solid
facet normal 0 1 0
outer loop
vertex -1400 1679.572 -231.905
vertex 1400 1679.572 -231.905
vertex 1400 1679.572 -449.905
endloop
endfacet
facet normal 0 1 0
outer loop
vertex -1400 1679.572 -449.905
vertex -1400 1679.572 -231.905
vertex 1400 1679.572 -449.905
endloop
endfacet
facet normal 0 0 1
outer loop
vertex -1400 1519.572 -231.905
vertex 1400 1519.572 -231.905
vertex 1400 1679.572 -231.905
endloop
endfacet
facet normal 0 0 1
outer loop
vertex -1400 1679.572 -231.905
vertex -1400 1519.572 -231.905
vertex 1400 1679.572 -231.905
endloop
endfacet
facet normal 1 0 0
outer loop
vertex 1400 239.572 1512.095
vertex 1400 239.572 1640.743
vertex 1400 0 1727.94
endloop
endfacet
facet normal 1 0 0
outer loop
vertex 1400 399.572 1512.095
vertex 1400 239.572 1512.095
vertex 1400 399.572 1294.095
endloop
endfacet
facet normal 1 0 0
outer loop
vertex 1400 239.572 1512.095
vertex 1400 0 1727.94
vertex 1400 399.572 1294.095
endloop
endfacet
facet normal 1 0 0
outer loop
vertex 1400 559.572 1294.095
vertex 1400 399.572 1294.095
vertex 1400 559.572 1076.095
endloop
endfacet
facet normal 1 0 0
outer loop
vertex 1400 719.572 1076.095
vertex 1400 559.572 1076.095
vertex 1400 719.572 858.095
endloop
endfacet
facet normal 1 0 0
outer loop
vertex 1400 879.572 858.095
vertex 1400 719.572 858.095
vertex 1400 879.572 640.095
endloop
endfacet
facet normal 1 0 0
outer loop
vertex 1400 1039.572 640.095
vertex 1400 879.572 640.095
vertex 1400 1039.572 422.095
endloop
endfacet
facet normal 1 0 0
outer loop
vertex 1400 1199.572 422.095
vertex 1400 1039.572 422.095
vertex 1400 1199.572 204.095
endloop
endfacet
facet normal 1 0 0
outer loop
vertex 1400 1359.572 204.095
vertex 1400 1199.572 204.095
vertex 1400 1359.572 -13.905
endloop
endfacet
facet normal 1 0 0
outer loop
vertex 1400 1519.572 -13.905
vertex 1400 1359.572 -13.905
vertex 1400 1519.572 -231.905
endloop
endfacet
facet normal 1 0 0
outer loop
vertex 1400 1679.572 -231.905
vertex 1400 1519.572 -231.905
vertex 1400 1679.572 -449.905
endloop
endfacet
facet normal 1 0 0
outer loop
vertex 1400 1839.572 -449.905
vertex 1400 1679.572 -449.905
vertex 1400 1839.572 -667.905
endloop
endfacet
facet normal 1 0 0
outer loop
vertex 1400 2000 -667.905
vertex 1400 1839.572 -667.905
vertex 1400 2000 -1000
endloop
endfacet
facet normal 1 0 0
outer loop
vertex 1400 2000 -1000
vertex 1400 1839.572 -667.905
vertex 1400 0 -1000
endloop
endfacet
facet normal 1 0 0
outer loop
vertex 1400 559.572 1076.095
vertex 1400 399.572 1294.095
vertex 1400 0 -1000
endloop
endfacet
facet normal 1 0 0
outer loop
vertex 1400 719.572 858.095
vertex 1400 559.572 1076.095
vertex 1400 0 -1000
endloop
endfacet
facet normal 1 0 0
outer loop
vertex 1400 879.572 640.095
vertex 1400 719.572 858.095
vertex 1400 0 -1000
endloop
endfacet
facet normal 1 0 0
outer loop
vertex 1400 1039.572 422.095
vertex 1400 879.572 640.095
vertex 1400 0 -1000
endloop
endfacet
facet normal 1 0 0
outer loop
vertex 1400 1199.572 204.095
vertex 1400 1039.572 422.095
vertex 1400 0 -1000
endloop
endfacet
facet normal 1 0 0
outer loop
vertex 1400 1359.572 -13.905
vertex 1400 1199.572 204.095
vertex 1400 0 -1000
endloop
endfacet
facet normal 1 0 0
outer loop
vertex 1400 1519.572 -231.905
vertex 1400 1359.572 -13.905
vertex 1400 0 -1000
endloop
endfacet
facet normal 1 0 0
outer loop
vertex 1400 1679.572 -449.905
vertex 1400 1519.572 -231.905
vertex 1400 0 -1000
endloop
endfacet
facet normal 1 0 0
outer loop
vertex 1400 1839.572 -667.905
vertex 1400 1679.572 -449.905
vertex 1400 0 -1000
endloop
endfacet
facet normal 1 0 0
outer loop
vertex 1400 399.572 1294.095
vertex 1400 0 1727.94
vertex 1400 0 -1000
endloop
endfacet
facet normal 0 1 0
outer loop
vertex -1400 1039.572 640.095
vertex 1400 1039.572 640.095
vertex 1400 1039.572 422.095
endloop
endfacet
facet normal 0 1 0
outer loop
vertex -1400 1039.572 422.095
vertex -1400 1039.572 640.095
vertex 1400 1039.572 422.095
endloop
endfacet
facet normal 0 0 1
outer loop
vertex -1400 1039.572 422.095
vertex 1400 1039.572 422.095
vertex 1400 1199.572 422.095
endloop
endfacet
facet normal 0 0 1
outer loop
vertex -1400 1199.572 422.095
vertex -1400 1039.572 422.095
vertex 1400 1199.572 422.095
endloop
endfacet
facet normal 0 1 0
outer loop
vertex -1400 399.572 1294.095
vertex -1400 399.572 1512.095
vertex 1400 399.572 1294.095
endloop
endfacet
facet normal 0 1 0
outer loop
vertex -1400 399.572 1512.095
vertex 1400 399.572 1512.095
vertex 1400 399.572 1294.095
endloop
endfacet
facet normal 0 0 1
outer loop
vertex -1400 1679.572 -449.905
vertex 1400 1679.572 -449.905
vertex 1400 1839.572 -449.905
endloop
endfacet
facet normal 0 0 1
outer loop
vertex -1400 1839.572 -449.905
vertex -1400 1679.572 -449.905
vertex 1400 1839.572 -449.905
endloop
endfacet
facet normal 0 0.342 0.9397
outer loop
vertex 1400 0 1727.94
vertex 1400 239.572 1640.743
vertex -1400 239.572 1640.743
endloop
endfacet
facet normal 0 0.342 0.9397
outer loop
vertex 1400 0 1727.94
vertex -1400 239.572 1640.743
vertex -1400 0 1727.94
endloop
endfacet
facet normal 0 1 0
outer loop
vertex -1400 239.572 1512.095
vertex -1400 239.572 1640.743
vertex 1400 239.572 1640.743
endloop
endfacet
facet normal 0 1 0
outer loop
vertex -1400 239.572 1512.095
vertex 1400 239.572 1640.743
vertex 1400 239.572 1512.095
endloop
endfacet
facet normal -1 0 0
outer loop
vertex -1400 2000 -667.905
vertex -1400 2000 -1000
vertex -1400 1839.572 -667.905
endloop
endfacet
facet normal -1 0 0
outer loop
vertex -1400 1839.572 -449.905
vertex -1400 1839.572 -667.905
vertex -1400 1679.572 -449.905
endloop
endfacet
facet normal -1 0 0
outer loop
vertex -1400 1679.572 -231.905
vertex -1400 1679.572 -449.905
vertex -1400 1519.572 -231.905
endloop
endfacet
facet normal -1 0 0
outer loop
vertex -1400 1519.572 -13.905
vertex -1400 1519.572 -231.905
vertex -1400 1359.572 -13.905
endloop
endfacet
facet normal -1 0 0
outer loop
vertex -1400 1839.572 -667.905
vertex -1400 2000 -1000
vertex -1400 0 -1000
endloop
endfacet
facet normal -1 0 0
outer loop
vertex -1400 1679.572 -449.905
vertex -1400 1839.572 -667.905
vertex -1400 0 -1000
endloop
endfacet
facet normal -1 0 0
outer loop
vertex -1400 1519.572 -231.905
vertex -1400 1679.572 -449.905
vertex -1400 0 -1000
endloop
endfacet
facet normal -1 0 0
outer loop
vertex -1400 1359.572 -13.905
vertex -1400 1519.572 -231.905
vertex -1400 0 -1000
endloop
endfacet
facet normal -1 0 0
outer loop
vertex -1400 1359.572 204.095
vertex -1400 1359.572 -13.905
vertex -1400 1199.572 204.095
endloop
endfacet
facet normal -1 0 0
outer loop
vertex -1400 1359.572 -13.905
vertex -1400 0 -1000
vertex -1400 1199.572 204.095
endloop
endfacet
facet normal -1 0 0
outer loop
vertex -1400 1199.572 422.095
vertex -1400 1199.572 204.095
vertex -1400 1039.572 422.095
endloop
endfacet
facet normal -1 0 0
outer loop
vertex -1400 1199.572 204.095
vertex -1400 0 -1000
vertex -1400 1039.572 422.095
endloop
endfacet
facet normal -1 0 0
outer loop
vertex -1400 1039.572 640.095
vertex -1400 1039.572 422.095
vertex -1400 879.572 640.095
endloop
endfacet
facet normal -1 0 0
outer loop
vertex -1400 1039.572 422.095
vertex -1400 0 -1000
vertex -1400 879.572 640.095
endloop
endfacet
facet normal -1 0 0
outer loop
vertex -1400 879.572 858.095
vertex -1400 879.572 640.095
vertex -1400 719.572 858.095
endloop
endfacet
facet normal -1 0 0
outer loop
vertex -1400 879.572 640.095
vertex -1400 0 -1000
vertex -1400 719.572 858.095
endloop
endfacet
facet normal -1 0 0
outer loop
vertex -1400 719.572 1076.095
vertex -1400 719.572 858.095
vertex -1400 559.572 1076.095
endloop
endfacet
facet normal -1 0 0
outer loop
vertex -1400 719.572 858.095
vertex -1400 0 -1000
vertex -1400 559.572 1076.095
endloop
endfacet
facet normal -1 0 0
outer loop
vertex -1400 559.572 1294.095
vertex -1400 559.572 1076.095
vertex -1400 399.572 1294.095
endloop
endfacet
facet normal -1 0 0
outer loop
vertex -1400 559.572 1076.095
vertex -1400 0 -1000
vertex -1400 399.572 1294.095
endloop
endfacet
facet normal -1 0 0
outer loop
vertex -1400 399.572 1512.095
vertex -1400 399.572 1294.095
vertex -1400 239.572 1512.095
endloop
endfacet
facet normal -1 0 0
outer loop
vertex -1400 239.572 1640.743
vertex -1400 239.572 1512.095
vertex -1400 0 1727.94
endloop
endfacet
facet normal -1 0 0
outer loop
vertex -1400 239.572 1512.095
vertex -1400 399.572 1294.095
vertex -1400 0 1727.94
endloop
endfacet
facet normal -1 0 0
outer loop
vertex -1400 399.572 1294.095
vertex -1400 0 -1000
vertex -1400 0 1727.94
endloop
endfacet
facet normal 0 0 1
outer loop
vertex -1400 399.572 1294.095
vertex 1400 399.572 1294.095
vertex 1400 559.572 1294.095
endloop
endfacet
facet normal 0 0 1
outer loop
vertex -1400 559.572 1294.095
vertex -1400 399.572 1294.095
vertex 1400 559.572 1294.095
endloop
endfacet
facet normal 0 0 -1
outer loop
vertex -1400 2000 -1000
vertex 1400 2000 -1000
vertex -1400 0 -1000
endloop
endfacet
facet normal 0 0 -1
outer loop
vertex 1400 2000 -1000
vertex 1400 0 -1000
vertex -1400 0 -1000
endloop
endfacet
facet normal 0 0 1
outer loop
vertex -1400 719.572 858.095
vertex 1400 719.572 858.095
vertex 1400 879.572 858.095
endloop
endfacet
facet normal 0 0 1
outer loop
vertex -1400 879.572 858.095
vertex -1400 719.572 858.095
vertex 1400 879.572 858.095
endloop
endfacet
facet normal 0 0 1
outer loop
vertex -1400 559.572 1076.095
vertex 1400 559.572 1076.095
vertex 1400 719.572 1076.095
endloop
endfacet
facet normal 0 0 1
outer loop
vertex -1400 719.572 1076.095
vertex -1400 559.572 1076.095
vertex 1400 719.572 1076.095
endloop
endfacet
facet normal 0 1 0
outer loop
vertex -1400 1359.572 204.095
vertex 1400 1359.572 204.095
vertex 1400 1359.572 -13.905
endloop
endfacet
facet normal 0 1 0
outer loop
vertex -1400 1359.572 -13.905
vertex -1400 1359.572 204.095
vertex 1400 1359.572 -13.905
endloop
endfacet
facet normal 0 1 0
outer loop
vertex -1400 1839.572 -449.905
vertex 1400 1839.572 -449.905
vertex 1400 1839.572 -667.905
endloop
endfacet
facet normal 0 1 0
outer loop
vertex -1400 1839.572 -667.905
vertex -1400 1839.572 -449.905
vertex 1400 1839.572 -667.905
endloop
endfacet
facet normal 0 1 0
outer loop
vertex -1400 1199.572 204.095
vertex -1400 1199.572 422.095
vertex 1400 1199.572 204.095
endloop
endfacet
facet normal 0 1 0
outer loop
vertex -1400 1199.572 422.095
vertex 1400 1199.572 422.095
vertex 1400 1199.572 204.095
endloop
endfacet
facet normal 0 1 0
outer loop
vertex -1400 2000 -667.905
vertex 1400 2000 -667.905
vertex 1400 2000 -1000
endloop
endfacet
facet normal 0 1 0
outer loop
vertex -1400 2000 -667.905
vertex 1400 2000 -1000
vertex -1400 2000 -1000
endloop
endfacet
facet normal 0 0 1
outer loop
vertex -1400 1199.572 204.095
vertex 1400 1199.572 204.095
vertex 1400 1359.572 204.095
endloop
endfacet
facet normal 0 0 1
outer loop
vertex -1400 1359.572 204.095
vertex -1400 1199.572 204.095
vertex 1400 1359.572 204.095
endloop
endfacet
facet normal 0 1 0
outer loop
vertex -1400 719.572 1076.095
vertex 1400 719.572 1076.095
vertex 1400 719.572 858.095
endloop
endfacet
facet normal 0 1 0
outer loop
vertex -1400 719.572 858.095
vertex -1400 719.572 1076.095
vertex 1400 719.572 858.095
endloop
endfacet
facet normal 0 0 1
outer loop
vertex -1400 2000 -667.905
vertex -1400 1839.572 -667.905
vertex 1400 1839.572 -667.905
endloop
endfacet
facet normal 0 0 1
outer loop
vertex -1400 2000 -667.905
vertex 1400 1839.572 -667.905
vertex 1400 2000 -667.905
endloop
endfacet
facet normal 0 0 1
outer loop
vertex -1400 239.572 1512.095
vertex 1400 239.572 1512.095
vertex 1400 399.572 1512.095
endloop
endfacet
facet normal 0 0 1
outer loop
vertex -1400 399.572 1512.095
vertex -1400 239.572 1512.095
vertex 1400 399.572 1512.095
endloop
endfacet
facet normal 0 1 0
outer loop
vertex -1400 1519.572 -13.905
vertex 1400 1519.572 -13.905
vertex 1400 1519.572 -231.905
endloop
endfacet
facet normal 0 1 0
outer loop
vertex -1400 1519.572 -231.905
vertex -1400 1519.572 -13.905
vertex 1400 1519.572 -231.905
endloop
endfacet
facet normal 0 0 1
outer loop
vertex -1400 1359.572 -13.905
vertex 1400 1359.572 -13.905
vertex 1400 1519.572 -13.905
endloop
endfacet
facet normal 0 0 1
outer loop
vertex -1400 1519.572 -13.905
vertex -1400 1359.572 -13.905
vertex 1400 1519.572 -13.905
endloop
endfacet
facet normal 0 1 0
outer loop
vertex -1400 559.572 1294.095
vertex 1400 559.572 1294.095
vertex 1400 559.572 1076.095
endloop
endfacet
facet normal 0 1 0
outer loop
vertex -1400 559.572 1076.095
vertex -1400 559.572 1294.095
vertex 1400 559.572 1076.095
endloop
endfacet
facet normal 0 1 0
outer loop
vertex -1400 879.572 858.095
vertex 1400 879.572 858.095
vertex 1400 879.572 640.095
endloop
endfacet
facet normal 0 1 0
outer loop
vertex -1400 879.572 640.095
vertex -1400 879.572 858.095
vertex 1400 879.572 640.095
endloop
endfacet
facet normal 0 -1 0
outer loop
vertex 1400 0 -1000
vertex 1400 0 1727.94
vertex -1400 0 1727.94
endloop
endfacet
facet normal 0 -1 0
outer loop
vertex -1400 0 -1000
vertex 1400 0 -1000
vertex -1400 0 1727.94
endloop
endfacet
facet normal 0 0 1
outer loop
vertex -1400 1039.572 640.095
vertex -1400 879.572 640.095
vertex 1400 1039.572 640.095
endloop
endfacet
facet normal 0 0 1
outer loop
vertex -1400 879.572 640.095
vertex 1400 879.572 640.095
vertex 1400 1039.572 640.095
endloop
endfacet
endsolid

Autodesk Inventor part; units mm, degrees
ref_plane "YZ Plane" through (0, 0, 0) normal (1, 0, 0) x (0, 1, 0)
ref_plane "XZ Plane" through (0, 0, 0) normal (0, 1, 0) x (-1, 0, 0)
ref_plane "XY Plane" through (0, 0, 0) normal (0, 0, 1) x (1, 0, 0)
sketch "Sketch1" plane through (0, 0, 0) normal (0, 1, 0) x (-1, 0, 0)
  line L0 (1400, 1000) -> (-1400, 1000)
  line L1 (-1400, 1000) -> (-1400, -1000)
  line L2 (-1400, -1000) -> (1400, -1000)
  line L3 (1400, -1000) -> (1400, 1000)
  line L4 (1400, 1000) -> (-1400, -1000) construction
  line L5 (-1400, 1000) -> (1400, -1000) construction
  point P0 (0, 0)
  dimension "d0" = 2800
  dimension "d1" = 2000
extrude "Extrusion1" add sketch "Sketch1" along normal blind 2000
sketch "Sketch2" plane through (1400, 0, 1000) normal (1, 0, 0) x (0, 0, -1)
  line L0 (0, 2000) -> (2000, 2000) projected
  line L1 (0, 0) -> (2000, 0) projected
  line L2 (0, 2000) -> (0, 0)
  line L3 (0, 0) -> (-727.9405, 0)
  line L4 (0, 2000) -> (-727.9405, 0)
  line L5 (0, 2000) -> (2128.3555, 2000) construction
  point P0 (1000, 0)
  dimension "d4" = 110
extrude "Extrusion2" add sketch "Sketch2" against normal blind 2800
sketch "Sketch3" plane through (1400, 0, -1000) normal (1, 0, 0) x (0, 0, -1)
  line L0 (-2.1545, -0.4275) -> (-2.1545, 1999.5725)
  line L1 (-2.1545, -0.4275) -> (-2.1545, 159.5725)
  line L2 (-2.1545, 159.5725) -> (-2.1545, 319.5725)
  line L3 (-2.1545, 319.5725) -> (-2.1545, 479.5725)
  line L4 (-2.1545, 479.5725) -> (-2.1545, 639.5725)
  line L5 (-2.1545, 639.5725) -> (-2.1545, 799.5725)
  line L6 (-2.1545, 799.5725) -> (-2.1545, 959.5725)
  line L7 (-2.1545, 959.5725) -> (-2.1545, 1119.5725)
  line L8 (-2.1545, 1119.5725) -> (-2.1545, 1279.5725)
  line L9 (-2.1545, 1279.5725) -> (-2.1545, 1439.5725)
  line L10 (-2.1545, 1439.5725) -> (-2.1545, 1599.5725)
  line L11 (-2.1545, 1599.5725) -> (-2.1545, 1759.5725)
  line L12 (-2.1545, 1759.5725) -> (-2.1545, 1919.5725)
  line L13 (-2.1545, 1919.5725) -> (-2.1545, 1999.9008)
  line L14 (-2.1545, -0.4275) -> (-2730.0949, -0.4275)
  line L15 (-2730.0949, -0.4275) -> (-2512.0949, -0.4275)
  line L16 (-2512.0949, -0.4275) -> (-2294.0949, -0.4275)
  line L17 (-2294.0949, -0.4275) -> (-2076.0949, -0.4275)
  line L18 (-2076.0949, -0.4275) -> (-1858.0949, -0.4275)
  line L19 (-1858.0949, -0.4275) -> (-1640.0949, -0.4275)
  line L20 (-1640.0949, -0.4275) -> (-1422.0949, -0.4275)
  line L21 (-1422.0949, -0.4275) -> (-1204.0949, -0.4275)
  line L22 (-1204.0949, -0.4275) -> (-986.0949, -0.4275)
  line L23 (-986.0949, -0.4275) -> (-768.0949, -0.4275)
  line L24 (-768.0949, -0.4275) -> (-550.0949, -0.4275)
  line L25 (-550.0949, -0.4275) -> (-332.0949, -0.4275)
  line L26 (-332.0949, -0.4275) -> (-114.0949, -0.4275)
  line L27 (-114.0949, -0.4275) -> (-2.1545, -0.4275)
  line L28 (-2730.0949, -0.4275) -> (-2642.7421, 239.5725)
  line L29 (-2730.0949, -0.4275) -> (-2002.1545, 1999.5725)
  line L30 (-2642.7421, 239.5725) -> (-2512.0949, 239.5725)
  line L31 (-2512.0949, 239.5725) -> (-2512.0949, 399.5725)
  line L32 (-2512.0949, 399.5725) -> (-2294.0949, 399.5725)
  line L33 (-2294.0949, 399.5725) -> (-2294.0949, 559.5725)
  line L34 (-2294.0949, 559.5725) -> (-2076.0949, 559.5725)
  line L35 (-2076.0949, 559.5725) -> (-2076.0949, 719.5725)
  line L36 (-2076.0949, 719.5725) -> (-1858.0949, 719.5725)
  line L37 (-1858.0949, 719.5725) -> (-1858.0949, 879.5725)
  line L38 (-1858.0949, 879.5725) -> (-1640.0949, 879.5725)
  line L39 (-1640.0949, 879.5725) -> (-1640.0949, 1039.5725)
  line L40 (-1640.0949, 1039.5725) -> (-1422.0949, 1039.5725)
  line L41 (-1422.0949, 1039.5725) -> (-1422.0949, 1199.5725)
  line L42 (-1422.0949, 1199.5725) -> (-1204.0949, 1199.5725)
  line L43 (-1204.0949, 1199.5725) -> (-1204.0949, 1359.5725)
  line L44 (-1204.0949, 1359.5725) -> (-986.0949, 1359.5725)
  line L45 (-986.0949, 1359.5725) -> (-986.0949, 1519.5725)
  line L46 (-986.0949, 1519.5725) -> (-768.0949, 1519.5725)
  line L47 (-768.0949, 1519.5725) -> (-768.0949, 1679.5725)
  line L48 (-768.0949, 1679.5725) -> (-550.0949, 1679.5725)
  line L49 (-550.0949, 1679.5725) -> (-550.0949, 1839.5725)
  line L50 (-550.0949, 1839.5725) -> (-332.0949, 1839.5725)
  line L51 (-332.0949, 1839.5725) -> (-332.0949, 1999.5725)
  line L52 (-332.0949, 1999.5725) -> (-2002.1545, 1999.5725)
  line L53 (-2002.1545, 1999.5725) -> (-2642.7421, 239.5725)
  line L54 (-2727.9405, 0) -> (0, 0) projected
  line L55 (-332.0949, 1999.5725) -> (-332.0949, 2182.2078)
  line L56 (-332.0949, 2182.2078) -> (-3155.7019, 2182.2078)
  line L57 (-3155.7019, 2182.2078) -> (-3155.7019, 0)
  line L58 (-3155.7019, 0) -> (-2727.9405, 0)
  point P0 (-1000, 0)
  point P1 (-1002.1545, -0.4275)
  point P2 (-2729.9393, 0)
  dimension "d7" = 160
  dimension "d8" = 160
  dimension "d9" = 160
  dimension "d10" = 160
  dimension "d11" = 160
  dimension "d12" = 160
  dimension "d13" = 160
  dimension "d14" = 160
  dimension "d15" = 160
  dimension "d16" = 160
  dimension "d17" = 160
  dimension "d18" = 160
  dimension "d19" = 218
  dimension "d20" = 218
  dimension "d21" = 218
  dimension "d22" = 218
  dimension "d23" = 218
  dimension "d24" = 218
  dimension "d25" = 218
  dimension "d26" = 218
  dimension "d27" = 218
  dimension "d28" = 218
  dimension "d29" = 218
  dimension "d30" = 218
extrude "Extrusion3" cut sketch "Sketch3" against normal blind 2800 contours L58 L57 L56 L55 L52 L29 L28 | L29 L52 L51 L50 L49 L48 L47 L46 L45 L44 L43 L42 L41 L40 L39 L38 L37 L36 L35 L34 L33 L32 L31 L30
properties part number "side_stair"
